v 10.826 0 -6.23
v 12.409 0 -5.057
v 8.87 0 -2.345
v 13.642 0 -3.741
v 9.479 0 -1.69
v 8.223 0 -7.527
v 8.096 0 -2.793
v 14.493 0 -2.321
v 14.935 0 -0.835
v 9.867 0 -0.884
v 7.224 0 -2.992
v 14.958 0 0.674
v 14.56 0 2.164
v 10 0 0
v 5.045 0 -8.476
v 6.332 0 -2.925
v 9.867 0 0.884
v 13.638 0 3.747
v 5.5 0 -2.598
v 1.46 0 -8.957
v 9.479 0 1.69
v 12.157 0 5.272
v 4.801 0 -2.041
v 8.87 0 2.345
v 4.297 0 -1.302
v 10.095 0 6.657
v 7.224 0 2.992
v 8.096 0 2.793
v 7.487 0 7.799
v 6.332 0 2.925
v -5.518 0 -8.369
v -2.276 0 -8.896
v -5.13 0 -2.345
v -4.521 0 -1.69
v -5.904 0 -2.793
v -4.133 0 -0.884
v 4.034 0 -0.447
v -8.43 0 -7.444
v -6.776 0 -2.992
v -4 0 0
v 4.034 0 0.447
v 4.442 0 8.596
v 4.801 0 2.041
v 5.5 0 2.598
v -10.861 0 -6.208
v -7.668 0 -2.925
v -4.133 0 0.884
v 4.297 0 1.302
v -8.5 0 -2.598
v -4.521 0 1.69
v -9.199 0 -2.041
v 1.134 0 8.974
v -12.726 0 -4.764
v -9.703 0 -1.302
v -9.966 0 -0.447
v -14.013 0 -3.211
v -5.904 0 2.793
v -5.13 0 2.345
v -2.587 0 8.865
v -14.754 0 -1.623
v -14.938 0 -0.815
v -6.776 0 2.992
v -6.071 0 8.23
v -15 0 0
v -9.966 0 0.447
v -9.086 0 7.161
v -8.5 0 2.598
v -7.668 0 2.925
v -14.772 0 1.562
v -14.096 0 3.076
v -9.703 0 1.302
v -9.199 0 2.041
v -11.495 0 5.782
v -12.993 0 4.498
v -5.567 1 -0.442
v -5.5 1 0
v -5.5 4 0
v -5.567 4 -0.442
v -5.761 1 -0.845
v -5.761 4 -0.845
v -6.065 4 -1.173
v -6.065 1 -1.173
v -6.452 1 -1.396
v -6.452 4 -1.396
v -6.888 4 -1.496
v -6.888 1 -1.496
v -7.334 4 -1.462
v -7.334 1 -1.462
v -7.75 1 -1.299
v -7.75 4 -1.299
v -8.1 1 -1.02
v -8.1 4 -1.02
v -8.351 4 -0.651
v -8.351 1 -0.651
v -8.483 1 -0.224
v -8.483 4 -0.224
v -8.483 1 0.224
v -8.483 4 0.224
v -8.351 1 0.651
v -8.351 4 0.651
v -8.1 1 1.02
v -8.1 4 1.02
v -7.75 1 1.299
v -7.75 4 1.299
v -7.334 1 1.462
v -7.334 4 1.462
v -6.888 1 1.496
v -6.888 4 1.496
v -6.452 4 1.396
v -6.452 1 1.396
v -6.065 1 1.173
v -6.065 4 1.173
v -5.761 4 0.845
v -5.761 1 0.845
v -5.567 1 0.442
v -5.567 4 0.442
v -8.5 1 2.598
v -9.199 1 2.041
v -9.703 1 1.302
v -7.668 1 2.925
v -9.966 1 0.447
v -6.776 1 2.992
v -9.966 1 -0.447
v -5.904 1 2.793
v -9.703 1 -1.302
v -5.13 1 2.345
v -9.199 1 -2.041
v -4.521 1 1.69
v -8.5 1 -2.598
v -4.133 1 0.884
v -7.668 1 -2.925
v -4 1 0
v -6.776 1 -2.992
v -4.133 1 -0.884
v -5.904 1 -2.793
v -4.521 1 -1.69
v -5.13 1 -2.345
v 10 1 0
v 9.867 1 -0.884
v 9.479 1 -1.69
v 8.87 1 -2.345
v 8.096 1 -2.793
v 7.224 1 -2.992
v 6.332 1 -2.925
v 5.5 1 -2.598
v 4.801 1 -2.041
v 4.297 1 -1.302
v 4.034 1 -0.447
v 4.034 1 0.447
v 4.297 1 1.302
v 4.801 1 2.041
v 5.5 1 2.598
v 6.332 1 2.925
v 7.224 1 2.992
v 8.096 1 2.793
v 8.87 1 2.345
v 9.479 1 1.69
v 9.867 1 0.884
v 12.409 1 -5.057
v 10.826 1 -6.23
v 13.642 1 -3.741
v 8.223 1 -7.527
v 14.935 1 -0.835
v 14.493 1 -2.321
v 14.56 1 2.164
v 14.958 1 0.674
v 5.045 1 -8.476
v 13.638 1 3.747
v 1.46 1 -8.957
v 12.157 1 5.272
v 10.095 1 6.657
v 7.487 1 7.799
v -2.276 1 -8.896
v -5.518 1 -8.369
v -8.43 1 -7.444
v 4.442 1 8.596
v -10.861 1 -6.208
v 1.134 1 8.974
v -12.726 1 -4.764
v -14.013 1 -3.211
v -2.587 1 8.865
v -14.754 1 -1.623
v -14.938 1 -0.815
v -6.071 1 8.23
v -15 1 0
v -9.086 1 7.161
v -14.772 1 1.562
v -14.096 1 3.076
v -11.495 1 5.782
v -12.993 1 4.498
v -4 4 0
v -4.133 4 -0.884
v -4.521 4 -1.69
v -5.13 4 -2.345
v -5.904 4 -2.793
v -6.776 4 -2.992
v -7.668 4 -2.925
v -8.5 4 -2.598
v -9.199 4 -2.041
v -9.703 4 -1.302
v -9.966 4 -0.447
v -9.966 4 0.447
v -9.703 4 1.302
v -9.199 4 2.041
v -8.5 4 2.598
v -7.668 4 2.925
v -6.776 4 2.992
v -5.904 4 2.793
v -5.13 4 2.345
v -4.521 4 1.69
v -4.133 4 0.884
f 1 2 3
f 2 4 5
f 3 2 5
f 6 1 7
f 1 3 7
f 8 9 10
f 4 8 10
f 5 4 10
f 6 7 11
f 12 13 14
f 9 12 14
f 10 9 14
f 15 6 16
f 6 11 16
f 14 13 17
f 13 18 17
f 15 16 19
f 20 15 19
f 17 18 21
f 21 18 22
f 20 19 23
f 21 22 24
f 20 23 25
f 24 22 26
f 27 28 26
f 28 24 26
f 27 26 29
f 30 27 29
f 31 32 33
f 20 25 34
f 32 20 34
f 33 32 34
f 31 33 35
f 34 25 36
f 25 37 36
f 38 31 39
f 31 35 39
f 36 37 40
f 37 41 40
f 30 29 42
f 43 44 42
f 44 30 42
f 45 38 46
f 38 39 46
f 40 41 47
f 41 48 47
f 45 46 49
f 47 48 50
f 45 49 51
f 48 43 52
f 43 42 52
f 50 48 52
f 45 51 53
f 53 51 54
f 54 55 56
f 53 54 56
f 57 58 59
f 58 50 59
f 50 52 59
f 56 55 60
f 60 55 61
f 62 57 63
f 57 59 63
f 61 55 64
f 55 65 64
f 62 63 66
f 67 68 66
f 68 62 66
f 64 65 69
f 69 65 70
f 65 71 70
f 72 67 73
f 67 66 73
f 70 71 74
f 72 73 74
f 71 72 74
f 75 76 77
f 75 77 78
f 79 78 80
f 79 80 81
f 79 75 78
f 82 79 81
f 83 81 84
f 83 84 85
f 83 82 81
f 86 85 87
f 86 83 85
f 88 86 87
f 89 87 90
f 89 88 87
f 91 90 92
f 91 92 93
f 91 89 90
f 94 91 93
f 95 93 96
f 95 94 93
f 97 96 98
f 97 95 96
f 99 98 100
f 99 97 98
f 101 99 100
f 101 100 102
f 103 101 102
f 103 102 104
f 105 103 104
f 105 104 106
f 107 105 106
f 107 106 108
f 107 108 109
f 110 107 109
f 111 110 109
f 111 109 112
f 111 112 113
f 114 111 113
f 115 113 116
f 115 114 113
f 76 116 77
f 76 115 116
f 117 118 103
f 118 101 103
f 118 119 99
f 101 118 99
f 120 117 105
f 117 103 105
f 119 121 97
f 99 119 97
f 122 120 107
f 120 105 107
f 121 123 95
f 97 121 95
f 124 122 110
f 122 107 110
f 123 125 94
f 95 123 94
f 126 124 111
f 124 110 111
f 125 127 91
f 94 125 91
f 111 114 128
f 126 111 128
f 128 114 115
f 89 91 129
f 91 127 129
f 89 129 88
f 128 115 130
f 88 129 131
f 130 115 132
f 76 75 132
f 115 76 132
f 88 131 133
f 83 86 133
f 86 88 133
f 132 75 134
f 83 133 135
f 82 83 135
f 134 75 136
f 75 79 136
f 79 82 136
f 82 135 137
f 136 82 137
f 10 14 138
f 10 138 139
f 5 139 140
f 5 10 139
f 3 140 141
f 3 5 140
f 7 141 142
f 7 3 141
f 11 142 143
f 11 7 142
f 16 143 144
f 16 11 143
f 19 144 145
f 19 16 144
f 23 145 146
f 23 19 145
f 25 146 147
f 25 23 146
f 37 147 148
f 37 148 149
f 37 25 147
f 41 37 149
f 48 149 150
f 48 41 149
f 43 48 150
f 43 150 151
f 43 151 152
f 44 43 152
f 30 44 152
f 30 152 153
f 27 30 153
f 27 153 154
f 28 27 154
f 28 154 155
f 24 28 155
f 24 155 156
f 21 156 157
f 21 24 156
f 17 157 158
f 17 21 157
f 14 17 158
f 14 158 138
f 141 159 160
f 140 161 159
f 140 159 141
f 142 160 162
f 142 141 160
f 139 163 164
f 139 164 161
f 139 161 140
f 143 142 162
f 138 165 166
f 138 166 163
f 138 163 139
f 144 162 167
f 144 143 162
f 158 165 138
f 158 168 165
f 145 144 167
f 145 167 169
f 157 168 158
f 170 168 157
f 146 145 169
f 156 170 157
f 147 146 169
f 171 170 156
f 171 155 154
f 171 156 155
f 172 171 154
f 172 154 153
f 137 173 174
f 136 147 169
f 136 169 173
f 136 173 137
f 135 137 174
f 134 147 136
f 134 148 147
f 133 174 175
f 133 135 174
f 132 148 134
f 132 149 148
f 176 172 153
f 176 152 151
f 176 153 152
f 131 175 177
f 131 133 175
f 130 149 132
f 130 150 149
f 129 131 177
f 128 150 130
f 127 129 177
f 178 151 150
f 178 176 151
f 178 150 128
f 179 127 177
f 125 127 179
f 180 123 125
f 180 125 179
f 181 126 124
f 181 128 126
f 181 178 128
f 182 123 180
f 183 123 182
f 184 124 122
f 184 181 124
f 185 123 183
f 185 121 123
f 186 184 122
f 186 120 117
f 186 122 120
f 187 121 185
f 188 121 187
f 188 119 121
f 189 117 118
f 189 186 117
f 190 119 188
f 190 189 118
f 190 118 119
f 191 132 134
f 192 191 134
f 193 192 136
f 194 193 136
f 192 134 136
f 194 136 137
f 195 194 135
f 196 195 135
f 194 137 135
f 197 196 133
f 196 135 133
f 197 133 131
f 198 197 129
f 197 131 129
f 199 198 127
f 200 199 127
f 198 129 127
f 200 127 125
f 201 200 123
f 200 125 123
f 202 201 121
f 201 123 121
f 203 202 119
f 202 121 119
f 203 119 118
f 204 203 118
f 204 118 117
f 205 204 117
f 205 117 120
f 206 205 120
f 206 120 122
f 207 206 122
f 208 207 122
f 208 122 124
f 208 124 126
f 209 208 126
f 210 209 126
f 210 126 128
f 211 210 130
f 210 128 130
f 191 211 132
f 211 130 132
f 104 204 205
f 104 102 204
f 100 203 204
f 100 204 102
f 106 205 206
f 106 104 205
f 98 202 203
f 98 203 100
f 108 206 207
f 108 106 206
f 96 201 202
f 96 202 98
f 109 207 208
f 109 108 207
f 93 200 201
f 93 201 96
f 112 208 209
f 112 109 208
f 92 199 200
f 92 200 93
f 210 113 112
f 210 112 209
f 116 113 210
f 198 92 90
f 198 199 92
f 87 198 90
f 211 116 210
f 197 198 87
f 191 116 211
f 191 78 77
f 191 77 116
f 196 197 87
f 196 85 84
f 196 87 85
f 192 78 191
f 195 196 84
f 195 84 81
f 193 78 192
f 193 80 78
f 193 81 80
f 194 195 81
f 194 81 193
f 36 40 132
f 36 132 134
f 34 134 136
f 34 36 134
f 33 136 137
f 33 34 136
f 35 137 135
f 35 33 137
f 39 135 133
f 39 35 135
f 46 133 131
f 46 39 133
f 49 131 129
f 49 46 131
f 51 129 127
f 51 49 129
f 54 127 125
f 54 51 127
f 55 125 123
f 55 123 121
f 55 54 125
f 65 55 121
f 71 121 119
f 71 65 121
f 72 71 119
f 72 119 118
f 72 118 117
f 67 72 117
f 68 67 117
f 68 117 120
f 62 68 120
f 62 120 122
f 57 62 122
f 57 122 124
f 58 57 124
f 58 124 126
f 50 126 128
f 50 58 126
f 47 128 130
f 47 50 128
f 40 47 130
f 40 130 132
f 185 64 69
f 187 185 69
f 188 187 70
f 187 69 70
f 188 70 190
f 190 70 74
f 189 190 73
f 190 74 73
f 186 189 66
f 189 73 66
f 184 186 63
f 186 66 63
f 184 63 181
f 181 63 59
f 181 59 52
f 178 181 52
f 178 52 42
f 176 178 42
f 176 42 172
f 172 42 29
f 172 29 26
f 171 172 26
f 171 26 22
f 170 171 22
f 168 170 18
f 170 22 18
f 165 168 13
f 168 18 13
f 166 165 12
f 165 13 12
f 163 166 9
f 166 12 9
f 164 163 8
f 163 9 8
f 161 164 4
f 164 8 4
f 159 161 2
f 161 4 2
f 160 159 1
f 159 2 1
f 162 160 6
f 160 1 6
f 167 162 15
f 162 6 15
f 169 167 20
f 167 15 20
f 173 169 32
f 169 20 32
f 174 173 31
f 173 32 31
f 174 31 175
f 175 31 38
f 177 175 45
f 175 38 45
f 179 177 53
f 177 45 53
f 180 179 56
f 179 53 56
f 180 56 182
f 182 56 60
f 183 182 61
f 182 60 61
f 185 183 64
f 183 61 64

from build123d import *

# Parameters (mm, degrees)
CROQUIS1_RX             = 15
CROQUIS1_RY             = 9
CROQUIS1_R              = 3
SALIENTE_EXTRUIR1_DEPTH = 1
CROQUIS2_R              = 3
CROQUIS2_R_2            = 1.5
SALIENTE_EXTRUIR2_DEPTH = 3


with BuildPart() as part:
    # Croquis1 → Saliente-Extruir1 (new body)
    with BuildSketch(Plane(origin=(0, 0, 0), x_dir=(1, 0, 0), z_dir=(0, 1, 0))):
        with Locations(Location((0, 0), (0, 0, -180))):
            Ellipse(CROQUIS1_RX, CROQUIS1_RY)
        with Locations((-7, 0)):
            Circle(CROQUIS1_R, mode=Mode.SUBTRACT)
        with Locations((7, 0)):
            Circle(CROQUIS1_R, mode=Mode.SUBTRACT)
    extrude(amount=SALIENTE_EXTRUIR1_DEPTH)


with BuildPart() as body_2:
    # Croquis2 → Saliente-Extruir2 (new body)
    with BuildSketch(Plane(origin=(0, 1, 0), x_dir=(1, 0, 0), z_dir=(0, 1, 0))):
        with Locations((-7, 0)):
            Circle(CROQUIS2_R)
        with Locations((-7, 0)):
            Circle(CROQUIS2_R_2, mode=Mode.SUBTRACT)
    extrude(amount=SALIENTE_EXTRUIR2_DEPTH)


solid = Compound([part.part, body_2.part])
